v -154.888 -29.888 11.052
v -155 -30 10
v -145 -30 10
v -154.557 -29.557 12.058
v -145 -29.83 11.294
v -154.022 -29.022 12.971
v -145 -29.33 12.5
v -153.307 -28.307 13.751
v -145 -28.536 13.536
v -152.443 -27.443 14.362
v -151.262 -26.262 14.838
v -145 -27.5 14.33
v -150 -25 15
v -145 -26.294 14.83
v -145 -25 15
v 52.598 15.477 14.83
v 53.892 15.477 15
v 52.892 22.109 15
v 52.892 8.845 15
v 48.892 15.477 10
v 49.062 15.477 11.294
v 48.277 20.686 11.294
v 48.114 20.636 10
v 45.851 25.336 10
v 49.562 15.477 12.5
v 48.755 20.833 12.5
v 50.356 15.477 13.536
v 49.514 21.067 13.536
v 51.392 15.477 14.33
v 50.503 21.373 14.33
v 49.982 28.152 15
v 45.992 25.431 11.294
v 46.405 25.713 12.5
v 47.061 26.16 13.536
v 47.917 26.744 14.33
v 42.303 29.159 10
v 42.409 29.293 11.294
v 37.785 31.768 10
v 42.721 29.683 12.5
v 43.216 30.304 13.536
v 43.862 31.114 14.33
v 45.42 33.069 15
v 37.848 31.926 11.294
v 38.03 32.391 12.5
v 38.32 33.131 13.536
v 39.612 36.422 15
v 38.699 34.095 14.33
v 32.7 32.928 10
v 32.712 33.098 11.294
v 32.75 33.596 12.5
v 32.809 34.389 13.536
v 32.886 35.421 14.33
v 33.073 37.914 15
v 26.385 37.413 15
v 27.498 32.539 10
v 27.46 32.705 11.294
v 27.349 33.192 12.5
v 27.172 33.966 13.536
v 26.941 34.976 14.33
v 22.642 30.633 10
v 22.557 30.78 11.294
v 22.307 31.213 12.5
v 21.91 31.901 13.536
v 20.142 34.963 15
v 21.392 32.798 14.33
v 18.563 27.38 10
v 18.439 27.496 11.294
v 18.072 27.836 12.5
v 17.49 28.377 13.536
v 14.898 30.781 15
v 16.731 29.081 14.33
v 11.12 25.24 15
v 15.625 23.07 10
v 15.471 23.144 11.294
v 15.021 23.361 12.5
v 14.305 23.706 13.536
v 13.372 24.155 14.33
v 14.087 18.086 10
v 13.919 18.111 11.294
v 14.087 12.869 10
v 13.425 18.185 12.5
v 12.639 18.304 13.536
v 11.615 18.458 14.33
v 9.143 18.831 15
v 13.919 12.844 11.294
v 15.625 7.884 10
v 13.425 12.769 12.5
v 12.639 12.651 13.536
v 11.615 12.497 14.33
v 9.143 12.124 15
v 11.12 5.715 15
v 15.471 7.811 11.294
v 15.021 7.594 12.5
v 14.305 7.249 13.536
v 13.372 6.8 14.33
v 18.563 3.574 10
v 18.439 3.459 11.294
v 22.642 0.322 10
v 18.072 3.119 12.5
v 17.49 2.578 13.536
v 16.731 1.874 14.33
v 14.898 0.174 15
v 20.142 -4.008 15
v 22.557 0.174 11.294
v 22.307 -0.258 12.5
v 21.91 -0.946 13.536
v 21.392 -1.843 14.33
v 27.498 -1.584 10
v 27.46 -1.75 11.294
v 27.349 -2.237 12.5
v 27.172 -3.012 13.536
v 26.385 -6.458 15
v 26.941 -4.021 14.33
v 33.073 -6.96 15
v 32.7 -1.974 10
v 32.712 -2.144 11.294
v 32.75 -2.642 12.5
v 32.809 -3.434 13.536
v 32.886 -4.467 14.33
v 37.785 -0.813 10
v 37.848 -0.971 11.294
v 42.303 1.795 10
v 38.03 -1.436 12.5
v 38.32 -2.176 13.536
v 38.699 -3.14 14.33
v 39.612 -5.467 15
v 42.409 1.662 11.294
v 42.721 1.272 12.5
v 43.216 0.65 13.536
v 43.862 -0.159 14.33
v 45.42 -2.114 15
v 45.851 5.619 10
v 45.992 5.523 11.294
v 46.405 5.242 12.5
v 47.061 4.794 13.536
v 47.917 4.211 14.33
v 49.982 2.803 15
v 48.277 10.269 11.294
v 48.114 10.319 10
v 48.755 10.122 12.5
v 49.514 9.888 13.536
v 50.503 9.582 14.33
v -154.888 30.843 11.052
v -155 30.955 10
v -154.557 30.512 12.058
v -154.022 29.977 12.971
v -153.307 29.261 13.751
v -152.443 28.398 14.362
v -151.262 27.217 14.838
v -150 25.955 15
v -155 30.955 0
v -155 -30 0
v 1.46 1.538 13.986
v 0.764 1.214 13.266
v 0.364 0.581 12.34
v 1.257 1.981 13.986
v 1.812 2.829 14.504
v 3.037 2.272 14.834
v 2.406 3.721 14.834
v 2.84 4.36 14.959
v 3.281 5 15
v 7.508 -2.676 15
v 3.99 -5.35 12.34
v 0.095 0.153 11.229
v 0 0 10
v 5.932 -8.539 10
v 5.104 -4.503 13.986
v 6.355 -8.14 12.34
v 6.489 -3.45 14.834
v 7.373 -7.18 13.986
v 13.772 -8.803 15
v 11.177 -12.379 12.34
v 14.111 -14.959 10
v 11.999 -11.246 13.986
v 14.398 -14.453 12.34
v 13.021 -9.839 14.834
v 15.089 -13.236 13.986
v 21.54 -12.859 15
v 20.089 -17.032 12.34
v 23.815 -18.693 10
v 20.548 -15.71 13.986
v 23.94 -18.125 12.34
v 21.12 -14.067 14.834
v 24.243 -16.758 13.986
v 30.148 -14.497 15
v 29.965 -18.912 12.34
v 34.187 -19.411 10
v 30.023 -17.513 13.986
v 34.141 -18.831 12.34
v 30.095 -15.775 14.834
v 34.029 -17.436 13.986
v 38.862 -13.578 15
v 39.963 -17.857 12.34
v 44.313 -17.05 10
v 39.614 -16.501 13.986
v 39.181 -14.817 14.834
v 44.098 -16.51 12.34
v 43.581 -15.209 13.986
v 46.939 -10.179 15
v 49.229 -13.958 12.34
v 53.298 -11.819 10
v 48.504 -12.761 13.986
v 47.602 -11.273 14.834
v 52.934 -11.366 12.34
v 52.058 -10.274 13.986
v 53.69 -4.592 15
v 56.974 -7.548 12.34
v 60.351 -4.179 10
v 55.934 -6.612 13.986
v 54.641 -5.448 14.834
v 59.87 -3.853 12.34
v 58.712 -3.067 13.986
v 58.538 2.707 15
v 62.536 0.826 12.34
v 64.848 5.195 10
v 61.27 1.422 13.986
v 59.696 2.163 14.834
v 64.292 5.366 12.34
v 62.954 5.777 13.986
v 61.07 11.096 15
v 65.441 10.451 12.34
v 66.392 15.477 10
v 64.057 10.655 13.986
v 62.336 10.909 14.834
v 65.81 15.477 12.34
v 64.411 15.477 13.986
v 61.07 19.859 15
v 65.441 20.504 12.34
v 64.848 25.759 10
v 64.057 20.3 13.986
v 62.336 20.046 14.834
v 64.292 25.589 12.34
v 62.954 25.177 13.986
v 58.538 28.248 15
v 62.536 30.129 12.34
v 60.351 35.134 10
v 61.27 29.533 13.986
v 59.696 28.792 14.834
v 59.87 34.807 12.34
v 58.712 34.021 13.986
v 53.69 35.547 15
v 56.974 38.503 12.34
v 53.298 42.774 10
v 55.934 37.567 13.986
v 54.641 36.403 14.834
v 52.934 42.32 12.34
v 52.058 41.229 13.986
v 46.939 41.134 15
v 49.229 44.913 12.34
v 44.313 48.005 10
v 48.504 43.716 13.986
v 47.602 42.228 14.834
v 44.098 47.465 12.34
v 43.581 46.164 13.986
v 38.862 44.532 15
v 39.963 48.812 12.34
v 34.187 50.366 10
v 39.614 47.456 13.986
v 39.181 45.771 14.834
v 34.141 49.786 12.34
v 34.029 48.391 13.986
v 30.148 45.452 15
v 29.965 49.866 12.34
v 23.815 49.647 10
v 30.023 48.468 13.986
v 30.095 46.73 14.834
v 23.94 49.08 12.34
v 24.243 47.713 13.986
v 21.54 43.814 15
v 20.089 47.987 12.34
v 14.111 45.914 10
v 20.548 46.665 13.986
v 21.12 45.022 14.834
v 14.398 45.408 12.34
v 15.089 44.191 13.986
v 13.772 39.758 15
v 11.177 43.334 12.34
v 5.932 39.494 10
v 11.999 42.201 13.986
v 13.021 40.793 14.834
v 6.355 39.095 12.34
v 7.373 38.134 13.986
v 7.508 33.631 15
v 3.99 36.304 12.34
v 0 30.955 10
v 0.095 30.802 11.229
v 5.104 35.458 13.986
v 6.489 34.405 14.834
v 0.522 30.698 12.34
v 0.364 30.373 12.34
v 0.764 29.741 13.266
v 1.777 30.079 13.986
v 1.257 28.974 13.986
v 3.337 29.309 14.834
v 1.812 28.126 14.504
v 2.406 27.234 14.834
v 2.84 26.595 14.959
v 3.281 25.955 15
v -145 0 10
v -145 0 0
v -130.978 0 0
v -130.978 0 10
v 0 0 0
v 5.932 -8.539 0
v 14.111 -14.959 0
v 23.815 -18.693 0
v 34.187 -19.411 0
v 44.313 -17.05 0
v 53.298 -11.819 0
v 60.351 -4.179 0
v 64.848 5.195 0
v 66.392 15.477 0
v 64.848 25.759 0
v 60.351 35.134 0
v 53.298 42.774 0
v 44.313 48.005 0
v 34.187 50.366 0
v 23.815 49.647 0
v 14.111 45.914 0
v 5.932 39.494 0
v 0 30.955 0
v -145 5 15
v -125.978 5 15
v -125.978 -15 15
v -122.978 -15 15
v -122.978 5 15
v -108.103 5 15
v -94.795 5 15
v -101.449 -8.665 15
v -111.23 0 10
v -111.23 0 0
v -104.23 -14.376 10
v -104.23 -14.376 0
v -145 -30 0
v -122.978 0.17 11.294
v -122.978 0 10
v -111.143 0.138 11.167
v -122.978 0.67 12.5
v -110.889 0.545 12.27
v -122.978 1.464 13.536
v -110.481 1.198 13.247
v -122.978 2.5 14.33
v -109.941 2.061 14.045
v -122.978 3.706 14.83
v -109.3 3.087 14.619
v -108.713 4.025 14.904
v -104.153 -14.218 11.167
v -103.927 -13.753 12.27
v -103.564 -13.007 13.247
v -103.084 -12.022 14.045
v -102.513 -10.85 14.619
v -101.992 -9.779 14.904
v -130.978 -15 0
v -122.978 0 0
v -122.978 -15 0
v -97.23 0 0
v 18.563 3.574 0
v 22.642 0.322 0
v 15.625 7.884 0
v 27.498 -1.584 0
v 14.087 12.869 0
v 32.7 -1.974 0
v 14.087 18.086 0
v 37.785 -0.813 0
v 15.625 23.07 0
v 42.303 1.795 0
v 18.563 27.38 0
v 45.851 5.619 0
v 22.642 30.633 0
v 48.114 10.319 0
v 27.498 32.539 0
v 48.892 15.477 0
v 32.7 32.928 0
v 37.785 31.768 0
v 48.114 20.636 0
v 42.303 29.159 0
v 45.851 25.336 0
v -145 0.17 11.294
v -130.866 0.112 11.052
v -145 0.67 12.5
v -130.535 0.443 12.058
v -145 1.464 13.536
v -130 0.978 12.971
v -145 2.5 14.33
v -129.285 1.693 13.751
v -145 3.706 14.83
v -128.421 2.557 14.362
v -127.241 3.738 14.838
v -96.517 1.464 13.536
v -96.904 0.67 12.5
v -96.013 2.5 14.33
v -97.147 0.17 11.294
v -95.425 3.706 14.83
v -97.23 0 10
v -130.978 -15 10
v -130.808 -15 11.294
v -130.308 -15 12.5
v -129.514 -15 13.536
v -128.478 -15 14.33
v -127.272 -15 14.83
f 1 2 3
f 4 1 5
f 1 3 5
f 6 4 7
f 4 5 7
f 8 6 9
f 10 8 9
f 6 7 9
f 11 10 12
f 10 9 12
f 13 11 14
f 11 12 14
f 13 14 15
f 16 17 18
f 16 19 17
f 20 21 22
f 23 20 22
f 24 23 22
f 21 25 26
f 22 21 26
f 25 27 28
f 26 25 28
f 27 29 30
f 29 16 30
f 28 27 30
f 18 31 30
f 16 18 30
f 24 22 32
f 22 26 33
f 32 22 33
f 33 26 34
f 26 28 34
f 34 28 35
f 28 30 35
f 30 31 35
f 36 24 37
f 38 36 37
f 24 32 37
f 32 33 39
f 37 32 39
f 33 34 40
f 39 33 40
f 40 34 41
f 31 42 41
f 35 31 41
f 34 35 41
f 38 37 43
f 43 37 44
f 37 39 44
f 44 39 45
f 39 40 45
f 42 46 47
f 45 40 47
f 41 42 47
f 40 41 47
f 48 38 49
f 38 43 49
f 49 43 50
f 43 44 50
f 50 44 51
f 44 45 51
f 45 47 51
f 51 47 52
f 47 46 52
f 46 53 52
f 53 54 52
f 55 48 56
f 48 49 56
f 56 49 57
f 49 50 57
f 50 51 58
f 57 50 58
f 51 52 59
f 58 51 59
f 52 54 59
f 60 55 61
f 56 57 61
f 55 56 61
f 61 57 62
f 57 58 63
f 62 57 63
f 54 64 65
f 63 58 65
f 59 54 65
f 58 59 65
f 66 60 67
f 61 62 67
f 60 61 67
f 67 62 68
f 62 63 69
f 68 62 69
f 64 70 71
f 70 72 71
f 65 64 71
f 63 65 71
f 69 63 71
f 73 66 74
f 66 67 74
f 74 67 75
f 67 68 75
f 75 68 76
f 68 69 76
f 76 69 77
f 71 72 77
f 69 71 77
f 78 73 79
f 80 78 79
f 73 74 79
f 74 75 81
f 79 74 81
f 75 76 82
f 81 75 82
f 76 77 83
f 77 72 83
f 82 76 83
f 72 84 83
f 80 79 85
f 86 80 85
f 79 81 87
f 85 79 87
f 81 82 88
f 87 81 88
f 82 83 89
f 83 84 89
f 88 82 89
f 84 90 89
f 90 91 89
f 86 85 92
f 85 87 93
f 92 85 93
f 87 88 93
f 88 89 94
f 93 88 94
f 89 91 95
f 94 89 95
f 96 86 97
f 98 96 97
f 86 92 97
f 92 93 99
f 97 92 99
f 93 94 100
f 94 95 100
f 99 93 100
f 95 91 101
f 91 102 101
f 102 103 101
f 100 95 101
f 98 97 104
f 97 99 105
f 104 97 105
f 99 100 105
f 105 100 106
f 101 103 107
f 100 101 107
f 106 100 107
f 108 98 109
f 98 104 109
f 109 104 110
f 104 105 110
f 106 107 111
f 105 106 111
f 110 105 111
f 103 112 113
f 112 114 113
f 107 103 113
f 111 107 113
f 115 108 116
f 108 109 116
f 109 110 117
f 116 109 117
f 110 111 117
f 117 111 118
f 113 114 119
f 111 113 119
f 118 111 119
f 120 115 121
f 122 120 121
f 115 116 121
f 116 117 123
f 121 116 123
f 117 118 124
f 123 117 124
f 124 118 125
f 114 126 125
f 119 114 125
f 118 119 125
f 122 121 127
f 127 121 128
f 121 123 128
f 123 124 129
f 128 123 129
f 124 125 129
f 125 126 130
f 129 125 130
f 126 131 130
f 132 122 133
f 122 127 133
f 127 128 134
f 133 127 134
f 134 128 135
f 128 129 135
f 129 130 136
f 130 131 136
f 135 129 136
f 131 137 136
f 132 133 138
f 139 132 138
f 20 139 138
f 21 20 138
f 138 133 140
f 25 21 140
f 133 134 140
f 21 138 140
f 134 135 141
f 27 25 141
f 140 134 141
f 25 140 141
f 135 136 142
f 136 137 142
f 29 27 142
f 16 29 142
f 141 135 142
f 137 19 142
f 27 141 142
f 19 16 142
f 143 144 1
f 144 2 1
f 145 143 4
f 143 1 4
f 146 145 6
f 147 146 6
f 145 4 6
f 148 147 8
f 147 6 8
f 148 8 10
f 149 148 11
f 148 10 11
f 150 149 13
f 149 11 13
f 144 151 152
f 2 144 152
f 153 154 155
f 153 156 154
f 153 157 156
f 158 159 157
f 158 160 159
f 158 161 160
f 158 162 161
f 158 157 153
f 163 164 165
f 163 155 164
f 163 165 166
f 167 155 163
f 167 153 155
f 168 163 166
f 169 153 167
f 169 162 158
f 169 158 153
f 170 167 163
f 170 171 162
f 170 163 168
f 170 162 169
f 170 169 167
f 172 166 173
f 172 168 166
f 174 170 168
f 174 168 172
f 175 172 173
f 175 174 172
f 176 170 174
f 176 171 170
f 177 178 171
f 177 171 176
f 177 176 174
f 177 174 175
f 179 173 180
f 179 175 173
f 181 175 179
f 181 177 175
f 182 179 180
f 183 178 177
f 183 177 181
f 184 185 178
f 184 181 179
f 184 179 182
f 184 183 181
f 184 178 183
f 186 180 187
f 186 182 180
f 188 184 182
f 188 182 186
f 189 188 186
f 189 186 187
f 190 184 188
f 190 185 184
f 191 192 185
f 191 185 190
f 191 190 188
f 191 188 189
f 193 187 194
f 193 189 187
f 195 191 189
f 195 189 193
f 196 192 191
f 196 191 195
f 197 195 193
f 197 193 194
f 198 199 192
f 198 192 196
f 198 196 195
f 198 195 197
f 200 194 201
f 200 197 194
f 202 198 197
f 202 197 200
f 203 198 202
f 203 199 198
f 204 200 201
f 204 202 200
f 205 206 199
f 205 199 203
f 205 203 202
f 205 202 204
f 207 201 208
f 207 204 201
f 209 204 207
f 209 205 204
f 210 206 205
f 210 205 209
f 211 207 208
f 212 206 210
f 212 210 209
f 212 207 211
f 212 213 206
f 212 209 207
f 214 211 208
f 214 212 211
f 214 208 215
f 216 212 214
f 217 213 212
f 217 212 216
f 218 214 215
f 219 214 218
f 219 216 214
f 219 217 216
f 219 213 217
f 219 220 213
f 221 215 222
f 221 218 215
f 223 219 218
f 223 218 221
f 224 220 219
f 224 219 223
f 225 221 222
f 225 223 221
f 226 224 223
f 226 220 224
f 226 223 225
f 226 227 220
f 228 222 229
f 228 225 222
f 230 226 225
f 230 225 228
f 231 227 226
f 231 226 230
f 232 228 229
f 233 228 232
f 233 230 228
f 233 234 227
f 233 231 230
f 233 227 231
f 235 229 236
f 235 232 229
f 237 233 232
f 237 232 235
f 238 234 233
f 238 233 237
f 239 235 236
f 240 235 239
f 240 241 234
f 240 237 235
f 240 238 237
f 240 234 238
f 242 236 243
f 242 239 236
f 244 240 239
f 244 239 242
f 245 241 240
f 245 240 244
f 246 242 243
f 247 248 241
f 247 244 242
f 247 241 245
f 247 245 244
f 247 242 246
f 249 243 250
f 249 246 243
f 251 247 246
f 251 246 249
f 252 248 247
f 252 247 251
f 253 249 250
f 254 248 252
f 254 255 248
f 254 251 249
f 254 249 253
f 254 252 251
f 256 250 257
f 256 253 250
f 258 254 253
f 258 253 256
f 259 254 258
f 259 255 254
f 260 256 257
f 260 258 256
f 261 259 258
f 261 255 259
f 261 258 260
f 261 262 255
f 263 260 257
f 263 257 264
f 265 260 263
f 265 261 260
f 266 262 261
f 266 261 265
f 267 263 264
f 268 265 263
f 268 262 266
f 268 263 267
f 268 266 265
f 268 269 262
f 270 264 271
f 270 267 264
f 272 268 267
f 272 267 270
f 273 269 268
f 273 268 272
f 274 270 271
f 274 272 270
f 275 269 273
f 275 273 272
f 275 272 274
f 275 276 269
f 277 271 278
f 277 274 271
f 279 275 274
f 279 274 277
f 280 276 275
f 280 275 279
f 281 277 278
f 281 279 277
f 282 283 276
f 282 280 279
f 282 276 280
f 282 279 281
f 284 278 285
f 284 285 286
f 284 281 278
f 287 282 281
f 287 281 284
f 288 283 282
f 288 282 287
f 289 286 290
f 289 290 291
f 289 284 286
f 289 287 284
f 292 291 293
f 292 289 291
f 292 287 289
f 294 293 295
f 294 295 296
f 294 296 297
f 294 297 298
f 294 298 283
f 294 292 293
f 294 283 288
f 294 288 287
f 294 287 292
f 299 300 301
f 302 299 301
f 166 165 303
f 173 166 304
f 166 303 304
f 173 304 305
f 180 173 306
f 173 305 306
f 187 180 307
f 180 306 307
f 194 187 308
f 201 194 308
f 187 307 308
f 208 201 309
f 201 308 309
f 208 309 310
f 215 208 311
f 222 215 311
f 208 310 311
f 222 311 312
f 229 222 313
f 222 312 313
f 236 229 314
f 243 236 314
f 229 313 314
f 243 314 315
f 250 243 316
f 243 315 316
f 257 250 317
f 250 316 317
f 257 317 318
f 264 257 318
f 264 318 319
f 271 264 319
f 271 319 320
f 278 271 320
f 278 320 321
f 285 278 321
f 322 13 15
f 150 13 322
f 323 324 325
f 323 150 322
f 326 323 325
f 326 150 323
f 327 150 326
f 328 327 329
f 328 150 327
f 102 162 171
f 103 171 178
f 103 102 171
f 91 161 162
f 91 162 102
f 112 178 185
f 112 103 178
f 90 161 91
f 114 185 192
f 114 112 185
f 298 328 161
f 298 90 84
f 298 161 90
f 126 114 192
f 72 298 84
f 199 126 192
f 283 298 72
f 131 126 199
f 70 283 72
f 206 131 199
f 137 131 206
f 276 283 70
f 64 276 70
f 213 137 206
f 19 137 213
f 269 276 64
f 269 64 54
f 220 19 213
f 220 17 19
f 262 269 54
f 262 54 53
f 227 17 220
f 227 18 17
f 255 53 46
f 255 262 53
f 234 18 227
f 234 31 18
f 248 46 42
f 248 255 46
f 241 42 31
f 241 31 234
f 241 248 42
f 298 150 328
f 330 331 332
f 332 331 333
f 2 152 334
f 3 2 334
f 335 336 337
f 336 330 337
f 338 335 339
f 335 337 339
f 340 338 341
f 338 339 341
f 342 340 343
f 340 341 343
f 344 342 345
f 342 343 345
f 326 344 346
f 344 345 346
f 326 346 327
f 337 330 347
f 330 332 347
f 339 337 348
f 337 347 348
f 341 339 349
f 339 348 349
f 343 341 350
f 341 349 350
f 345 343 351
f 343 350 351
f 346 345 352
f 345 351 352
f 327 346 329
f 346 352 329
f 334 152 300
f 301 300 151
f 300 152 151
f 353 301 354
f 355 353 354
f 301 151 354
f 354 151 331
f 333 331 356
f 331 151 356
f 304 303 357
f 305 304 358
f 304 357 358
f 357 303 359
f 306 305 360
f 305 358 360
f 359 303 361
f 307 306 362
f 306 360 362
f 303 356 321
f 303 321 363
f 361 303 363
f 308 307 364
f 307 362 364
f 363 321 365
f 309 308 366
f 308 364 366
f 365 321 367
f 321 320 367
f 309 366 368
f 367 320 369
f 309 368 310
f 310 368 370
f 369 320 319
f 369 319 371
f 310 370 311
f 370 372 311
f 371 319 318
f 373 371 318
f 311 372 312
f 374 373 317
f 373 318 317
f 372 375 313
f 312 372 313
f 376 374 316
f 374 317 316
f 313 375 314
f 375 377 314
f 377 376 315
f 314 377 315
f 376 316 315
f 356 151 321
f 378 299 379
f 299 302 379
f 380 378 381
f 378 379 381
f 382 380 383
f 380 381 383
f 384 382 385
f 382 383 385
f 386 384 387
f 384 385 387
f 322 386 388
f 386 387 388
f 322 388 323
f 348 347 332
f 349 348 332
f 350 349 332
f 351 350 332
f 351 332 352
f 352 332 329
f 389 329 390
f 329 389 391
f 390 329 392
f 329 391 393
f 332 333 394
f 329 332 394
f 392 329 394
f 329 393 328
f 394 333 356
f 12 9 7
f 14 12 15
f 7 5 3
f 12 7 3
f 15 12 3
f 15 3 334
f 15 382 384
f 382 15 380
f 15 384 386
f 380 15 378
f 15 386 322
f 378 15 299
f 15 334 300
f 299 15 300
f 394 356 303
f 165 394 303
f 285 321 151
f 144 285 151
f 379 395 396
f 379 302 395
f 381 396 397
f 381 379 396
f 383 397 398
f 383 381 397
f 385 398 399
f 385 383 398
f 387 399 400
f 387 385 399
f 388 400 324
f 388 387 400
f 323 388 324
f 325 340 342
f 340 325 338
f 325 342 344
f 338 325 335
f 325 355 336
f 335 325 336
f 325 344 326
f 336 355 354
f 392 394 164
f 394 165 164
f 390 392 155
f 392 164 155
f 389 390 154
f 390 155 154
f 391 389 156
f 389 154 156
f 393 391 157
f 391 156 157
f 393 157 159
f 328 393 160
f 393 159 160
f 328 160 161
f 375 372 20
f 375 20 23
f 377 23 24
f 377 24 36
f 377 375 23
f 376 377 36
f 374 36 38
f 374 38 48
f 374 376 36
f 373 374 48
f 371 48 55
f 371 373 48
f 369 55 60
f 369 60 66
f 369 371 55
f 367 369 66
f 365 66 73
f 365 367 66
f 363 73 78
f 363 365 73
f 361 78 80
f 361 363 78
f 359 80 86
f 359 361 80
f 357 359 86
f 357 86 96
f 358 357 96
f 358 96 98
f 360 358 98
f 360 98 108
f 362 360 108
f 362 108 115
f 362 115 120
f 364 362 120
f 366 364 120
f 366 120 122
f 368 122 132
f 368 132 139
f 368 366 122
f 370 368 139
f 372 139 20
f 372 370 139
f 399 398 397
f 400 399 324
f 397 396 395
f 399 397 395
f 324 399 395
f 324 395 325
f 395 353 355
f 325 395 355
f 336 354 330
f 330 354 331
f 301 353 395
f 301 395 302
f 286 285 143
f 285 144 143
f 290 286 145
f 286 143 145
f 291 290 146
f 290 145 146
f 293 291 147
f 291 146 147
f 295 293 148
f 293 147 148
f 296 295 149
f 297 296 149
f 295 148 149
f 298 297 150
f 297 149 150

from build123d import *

# Parameters (mm, degrees)
F0_R     = 17.5
F0_W     = 10
F0_H     = 30
F0_W_2   = 8
F0_H_2   = 15
F1_DEPTH = 15
F2_R     = 5


with BuildPart() as f1:
    # F0 (on Top) → F1 (new body)
    with BuildSketch(Plane.XY):
        with BuildLine():
            Line((0, 30.9548118476), (-155, 30.9548118476))
            Line((-155, 30.9548118476), (-155, 0))
            Line((-155, 0), (-145, 0))
            Line((-145, 0), (-130.978256464, 0))
            Line((-130.978256464, 0), (-122.978256464, 0))
            Line((-122.978256464, 0), (-111.2298741937, 0))
            Line((-111.2298741937, 0), (-97.2298741937, 0))
            Line((-97.2298741937, 0), (0, 0))
            ThreePointArc((0, 0), (66.3918764312, 15.4774059238), (0, 30.9548118476))
        make_face()
        with Locations((31.3918764312, 15.4774059238)):
            Circle(F0_R, mode=Mode.SUBTRACT)
        with Locations((-150, -15)):
            Rectangle(F0_W, F0_H)
        with Locations((-126.978256464, -7.5)):
            Rectangle(F0_W_2, F0_H_2)
        Polygon((-104.2298741937, -14.3756624311), (-97.2298741937, 0), (-111.2298741937, 0), align=None)
    extrude(amount=F1_DEPTH)

    # F2
    f2_edges = [f1.edges().sort_by_distance(p)[0] for p in [
        (-150, -30, 15),
        (-155, 0.477406, 15),
        (-137.989128, 0, 15),
        (-130.978256, -7.5, 15),
        (-107.729874, -7.187831, 15),
        (-117.104065, 0, 15),
        (-48.614937, 0, 15),
        (-77.5, 30.954812, 15),
        (66.391876, 15.477406, 15),
        (13.891876, 15.477406, 15),
    ]]
    fillet(f2_edges, radius=F2_R)


solid = f1.part
